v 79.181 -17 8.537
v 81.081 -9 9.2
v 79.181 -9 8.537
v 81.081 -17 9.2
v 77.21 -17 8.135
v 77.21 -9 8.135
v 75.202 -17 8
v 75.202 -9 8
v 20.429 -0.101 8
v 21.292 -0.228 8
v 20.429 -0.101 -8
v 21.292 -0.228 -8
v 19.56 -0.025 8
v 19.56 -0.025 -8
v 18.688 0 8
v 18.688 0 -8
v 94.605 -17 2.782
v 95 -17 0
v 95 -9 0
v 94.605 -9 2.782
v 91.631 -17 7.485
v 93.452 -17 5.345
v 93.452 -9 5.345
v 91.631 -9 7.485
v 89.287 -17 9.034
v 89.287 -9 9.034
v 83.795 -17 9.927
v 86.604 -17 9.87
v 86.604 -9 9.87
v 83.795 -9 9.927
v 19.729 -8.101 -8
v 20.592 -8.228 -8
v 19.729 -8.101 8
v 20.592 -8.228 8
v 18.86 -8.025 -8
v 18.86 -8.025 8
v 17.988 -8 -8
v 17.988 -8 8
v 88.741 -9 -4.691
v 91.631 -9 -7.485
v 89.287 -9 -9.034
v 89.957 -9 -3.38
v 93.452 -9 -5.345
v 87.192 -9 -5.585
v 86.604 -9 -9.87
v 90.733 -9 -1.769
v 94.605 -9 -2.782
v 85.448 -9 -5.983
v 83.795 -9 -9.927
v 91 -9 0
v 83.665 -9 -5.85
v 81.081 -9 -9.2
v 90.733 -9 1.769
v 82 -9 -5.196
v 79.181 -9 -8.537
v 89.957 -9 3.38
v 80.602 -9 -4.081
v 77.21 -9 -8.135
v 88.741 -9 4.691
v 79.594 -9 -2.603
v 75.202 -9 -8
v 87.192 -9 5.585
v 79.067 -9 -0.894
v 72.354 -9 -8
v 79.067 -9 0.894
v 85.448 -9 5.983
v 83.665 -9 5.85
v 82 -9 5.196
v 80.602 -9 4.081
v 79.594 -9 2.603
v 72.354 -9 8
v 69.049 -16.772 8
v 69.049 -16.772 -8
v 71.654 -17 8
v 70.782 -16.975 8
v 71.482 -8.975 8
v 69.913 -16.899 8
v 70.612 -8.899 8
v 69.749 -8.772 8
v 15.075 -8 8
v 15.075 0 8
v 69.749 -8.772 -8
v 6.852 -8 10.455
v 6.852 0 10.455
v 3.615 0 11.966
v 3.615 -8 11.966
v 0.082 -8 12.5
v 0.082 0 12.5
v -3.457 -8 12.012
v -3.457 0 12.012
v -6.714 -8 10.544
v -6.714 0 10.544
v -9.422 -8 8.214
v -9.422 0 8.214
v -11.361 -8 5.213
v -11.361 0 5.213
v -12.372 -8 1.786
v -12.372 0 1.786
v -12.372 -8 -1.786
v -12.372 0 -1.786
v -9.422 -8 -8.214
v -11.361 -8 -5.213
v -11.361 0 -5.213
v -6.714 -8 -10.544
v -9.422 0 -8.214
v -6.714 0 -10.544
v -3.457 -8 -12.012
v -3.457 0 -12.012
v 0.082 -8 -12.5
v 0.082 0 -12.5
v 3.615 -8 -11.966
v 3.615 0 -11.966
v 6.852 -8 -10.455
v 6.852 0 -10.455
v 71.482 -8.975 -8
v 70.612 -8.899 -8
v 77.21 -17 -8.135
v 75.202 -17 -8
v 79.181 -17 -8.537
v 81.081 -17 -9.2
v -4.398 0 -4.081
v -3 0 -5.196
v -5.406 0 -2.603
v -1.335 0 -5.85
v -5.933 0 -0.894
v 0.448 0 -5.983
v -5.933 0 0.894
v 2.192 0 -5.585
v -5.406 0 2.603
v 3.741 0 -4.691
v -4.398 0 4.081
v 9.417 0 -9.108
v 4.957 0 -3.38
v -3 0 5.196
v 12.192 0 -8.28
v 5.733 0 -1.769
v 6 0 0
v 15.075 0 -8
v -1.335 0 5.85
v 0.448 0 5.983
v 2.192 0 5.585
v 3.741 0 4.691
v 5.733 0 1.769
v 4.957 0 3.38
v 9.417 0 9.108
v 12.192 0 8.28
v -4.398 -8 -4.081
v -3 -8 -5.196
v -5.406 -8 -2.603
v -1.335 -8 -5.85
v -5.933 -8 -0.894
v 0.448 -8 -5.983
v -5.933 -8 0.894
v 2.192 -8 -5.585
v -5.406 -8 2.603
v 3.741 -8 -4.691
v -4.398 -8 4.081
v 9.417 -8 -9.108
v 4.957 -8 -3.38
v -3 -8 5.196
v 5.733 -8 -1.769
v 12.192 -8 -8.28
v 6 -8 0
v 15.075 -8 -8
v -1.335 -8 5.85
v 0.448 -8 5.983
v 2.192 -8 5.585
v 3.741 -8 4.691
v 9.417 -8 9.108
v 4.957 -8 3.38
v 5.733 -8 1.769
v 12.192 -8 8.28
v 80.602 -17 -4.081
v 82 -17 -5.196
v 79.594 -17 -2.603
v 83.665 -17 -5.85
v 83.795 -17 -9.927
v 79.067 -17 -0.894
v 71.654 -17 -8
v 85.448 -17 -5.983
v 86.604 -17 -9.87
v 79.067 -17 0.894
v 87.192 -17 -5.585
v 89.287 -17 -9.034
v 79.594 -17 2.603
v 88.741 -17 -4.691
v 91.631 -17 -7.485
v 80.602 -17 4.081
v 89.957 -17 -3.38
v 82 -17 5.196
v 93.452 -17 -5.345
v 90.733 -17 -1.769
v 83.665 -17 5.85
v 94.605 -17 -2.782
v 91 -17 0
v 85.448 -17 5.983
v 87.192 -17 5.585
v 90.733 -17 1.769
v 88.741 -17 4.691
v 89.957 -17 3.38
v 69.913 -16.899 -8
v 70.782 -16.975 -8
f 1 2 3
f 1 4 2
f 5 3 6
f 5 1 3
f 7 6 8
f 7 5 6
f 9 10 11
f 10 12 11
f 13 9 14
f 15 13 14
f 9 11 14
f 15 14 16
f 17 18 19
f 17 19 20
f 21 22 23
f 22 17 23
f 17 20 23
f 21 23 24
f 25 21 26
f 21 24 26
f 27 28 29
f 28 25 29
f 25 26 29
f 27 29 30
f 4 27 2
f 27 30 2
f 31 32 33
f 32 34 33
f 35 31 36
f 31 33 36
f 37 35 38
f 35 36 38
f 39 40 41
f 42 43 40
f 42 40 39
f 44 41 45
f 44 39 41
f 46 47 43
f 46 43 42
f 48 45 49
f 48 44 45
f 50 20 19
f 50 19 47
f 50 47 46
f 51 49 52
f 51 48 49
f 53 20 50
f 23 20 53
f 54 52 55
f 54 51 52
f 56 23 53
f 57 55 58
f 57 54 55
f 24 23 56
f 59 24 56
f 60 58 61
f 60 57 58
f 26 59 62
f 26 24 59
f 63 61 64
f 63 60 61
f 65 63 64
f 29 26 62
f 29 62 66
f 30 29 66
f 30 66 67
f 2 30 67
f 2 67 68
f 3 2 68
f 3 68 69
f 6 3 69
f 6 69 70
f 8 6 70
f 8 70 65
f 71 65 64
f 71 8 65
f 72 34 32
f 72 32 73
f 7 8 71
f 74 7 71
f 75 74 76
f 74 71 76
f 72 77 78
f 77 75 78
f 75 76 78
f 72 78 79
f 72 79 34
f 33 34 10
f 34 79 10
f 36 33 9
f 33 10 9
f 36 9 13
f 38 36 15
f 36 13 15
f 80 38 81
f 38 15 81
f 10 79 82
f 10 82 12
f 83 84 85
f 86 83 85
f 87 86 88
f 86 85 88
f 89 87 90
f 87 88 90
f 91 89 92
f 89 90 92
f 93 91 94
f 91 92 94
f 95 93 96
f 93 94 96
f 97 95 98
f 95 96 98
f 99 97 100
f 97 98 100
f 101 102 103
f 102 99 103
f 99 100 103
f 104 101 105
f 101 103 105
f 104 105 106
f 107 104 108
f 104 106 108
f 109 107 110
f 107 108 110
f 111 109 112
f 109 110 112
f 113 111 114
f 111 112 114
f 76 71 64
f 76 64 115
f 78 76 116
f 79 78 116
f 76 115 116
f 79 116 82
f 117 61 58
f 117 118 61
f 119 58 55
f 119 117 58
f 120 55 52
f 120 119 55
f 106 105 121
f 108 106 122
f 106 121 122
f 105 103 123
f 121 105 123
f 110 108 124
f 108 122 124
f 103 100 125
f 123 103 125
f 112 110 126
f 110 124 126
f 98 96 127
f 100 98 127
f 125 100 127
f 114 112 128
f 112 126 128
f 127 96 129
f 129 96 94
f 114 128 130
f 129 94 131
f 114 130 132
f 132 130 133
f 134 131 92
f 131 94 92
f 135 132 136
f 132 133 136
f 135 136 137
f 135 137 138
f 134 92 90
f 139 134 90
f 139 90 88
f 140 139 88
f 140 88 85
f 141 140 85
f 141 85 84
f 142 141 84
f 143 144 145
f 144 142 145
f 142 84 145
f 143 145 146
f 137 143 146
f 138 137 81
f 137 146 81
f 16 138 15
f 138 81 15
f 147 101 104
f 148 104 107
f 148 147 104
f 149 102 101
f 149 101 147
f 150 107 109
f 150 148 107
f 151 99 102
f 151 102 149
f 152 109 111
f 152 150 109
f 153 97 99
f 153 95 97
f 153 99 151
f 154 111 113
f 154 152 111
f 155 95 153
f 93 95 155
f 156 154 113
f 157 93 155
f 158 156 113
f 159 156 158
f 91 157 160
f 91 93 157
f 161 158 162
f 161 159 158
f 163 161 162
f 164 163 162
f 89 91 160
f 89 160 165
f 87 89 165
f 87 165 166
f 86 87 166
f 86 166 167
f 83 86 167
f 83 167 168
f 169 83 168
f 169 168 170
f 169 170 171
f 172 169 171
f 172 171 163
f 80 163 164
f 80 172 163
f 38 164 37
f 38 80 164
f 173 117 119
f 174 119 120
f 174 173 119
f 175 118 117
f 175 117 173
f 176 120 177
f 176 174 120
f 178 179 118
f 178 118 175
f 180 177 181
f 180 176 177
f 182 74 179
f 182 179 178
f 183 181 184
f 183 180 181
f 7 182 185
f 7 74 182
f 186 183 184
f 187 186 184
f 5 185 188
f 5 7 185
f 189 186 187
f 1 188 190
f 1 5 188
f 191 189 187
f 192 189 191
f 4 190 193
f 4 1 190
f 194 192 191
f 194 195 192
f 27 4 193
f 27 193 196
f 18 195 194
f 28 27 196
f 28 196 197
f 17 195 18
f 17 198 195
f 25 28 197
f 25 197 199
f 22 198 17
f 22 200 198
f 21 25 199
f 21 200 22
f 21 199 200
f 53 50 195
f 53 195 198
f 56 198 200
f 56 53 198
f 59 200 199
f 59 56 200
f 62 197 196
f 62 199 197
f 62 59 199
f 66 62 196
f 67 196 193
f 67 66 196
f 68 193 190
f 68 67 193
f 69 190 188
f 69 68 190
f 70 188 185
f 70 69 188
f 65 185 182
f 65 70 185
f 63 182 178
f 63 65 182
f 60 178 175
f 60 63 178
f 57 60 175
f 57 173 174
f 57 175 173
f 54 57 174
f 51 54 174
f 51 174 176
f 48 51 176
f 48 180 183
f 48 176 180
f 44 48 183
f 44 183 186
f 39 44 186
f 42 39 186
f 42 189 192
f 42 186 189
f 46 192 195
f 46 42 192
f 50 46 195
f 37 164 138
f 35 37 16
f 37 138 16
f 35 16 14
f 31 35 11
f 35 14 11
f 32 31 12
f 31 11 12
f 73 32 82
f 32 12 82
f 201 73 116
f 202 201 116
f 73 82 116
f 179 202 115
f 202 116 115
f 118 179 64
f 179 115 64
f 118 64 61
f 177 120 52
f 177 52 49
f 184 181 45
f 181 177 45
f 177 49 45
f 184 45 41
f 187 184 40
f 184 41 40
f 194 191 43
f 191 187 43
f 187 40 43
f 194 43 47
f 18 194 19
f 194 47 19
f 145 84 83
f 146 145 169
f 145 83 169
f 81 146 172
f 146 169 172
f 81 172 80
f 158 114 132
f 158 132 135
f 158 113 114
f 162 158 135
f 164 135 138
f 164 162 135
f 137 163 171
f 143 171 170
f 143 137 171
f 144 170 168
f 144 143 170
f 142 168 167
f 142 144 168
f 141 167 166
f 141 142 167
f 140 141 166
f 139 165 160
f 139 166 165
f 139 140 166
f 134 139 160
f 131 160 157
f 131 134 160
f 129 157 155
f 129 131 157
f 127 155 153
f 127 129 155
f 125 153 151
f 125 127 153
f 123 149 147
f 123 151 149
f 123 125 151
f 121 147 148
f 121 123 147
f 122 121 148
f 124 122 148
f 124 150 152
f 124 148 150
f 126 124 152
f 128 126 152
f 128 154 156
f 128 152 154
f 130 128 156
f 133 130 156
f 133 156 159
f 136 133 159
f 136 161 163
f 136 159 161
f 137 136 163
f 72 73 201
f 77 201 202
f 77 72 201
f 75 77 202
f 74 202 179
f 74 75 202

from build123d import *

# Parameters (mm, degrees)
F0_R     = 6
F1_DEPTH = 25
F3_DEPTH = 12.5
F4_R     = 15


with BuildPart() as f1:
    # F0 (on Front) → F1 (new body)
    with BuildSketch(Plane.XZ):
        with BuildLine():
            ThreePointArc((9.604686, -8), (11.753905, -4.253905), (12.5, 0))
            ThreePointArc((12.5, 0), (11.753905, 4.253905), (9.604686, 8))
            ThreePointArc((9.604686, 8), (-12.5, 0), (9.604686, -8))
        make_face()
        Circle(F0_R, mode=Mode.SUBTRACT)
        with BuildLine():
            ThreePointArc((9.604686, 8), (11.753905, 4.253905), (12.5, 0))
            ThreePointArc((12.5, 0), (11.753905, -4.253905), (9.604686, -8))
            Line((9.604686, -8), (79, -8))
            ThreePointArc((79, -8), (75, 0), (79, 8))
            Line((79, 8), (9.604686, 8))
        make_face()
        with BuildLine():
            ThreePointArc((95, 0), (89.472136, 8.944272), (79, 8))
            ThreePointArc((79, 8), (75, 0), (79, -8))
            ThreePointArc((79, -8), (89.472136, -8.944272), (95, 0))
        make_face()
        with Locations((85, 0)):
            Circle(F0_R, mode=Mode.SUBTRACT)
    extrude(amount=F1_DEPTH)

    # F2 (on Top) → F3 (intersect, symmetric)
    with BuildSketch(Plane.XY):
        Polygon((20, 0), (-12.5, 0), (-12.5, -8), (19.300091, -8), (70.341622, -16.999999), (95, -16.999999), (95, -8.999999), (71.041532, -8.999999), align=None)
    extrude(amount=F3_DEPTH, both=True, mode=Mode.INTERSECT)

    # F4
    f4_edges = [f1.edges().sort_by_distance(p)[0] for p in [
        (20, 0, 0),
        (19.300091, -8, 0),
        (70.341622, -16.999999, 0),
        (71.041532, -8.999999, 0),
        (79, -12.999999, -8),
        (9.604686, -4, -8),
        (9.604686, -4, 8),
        (79, -12.999999, 8),
    ]]
    fillet(f4_edges, radius=F4_R)


solid = f1.part
